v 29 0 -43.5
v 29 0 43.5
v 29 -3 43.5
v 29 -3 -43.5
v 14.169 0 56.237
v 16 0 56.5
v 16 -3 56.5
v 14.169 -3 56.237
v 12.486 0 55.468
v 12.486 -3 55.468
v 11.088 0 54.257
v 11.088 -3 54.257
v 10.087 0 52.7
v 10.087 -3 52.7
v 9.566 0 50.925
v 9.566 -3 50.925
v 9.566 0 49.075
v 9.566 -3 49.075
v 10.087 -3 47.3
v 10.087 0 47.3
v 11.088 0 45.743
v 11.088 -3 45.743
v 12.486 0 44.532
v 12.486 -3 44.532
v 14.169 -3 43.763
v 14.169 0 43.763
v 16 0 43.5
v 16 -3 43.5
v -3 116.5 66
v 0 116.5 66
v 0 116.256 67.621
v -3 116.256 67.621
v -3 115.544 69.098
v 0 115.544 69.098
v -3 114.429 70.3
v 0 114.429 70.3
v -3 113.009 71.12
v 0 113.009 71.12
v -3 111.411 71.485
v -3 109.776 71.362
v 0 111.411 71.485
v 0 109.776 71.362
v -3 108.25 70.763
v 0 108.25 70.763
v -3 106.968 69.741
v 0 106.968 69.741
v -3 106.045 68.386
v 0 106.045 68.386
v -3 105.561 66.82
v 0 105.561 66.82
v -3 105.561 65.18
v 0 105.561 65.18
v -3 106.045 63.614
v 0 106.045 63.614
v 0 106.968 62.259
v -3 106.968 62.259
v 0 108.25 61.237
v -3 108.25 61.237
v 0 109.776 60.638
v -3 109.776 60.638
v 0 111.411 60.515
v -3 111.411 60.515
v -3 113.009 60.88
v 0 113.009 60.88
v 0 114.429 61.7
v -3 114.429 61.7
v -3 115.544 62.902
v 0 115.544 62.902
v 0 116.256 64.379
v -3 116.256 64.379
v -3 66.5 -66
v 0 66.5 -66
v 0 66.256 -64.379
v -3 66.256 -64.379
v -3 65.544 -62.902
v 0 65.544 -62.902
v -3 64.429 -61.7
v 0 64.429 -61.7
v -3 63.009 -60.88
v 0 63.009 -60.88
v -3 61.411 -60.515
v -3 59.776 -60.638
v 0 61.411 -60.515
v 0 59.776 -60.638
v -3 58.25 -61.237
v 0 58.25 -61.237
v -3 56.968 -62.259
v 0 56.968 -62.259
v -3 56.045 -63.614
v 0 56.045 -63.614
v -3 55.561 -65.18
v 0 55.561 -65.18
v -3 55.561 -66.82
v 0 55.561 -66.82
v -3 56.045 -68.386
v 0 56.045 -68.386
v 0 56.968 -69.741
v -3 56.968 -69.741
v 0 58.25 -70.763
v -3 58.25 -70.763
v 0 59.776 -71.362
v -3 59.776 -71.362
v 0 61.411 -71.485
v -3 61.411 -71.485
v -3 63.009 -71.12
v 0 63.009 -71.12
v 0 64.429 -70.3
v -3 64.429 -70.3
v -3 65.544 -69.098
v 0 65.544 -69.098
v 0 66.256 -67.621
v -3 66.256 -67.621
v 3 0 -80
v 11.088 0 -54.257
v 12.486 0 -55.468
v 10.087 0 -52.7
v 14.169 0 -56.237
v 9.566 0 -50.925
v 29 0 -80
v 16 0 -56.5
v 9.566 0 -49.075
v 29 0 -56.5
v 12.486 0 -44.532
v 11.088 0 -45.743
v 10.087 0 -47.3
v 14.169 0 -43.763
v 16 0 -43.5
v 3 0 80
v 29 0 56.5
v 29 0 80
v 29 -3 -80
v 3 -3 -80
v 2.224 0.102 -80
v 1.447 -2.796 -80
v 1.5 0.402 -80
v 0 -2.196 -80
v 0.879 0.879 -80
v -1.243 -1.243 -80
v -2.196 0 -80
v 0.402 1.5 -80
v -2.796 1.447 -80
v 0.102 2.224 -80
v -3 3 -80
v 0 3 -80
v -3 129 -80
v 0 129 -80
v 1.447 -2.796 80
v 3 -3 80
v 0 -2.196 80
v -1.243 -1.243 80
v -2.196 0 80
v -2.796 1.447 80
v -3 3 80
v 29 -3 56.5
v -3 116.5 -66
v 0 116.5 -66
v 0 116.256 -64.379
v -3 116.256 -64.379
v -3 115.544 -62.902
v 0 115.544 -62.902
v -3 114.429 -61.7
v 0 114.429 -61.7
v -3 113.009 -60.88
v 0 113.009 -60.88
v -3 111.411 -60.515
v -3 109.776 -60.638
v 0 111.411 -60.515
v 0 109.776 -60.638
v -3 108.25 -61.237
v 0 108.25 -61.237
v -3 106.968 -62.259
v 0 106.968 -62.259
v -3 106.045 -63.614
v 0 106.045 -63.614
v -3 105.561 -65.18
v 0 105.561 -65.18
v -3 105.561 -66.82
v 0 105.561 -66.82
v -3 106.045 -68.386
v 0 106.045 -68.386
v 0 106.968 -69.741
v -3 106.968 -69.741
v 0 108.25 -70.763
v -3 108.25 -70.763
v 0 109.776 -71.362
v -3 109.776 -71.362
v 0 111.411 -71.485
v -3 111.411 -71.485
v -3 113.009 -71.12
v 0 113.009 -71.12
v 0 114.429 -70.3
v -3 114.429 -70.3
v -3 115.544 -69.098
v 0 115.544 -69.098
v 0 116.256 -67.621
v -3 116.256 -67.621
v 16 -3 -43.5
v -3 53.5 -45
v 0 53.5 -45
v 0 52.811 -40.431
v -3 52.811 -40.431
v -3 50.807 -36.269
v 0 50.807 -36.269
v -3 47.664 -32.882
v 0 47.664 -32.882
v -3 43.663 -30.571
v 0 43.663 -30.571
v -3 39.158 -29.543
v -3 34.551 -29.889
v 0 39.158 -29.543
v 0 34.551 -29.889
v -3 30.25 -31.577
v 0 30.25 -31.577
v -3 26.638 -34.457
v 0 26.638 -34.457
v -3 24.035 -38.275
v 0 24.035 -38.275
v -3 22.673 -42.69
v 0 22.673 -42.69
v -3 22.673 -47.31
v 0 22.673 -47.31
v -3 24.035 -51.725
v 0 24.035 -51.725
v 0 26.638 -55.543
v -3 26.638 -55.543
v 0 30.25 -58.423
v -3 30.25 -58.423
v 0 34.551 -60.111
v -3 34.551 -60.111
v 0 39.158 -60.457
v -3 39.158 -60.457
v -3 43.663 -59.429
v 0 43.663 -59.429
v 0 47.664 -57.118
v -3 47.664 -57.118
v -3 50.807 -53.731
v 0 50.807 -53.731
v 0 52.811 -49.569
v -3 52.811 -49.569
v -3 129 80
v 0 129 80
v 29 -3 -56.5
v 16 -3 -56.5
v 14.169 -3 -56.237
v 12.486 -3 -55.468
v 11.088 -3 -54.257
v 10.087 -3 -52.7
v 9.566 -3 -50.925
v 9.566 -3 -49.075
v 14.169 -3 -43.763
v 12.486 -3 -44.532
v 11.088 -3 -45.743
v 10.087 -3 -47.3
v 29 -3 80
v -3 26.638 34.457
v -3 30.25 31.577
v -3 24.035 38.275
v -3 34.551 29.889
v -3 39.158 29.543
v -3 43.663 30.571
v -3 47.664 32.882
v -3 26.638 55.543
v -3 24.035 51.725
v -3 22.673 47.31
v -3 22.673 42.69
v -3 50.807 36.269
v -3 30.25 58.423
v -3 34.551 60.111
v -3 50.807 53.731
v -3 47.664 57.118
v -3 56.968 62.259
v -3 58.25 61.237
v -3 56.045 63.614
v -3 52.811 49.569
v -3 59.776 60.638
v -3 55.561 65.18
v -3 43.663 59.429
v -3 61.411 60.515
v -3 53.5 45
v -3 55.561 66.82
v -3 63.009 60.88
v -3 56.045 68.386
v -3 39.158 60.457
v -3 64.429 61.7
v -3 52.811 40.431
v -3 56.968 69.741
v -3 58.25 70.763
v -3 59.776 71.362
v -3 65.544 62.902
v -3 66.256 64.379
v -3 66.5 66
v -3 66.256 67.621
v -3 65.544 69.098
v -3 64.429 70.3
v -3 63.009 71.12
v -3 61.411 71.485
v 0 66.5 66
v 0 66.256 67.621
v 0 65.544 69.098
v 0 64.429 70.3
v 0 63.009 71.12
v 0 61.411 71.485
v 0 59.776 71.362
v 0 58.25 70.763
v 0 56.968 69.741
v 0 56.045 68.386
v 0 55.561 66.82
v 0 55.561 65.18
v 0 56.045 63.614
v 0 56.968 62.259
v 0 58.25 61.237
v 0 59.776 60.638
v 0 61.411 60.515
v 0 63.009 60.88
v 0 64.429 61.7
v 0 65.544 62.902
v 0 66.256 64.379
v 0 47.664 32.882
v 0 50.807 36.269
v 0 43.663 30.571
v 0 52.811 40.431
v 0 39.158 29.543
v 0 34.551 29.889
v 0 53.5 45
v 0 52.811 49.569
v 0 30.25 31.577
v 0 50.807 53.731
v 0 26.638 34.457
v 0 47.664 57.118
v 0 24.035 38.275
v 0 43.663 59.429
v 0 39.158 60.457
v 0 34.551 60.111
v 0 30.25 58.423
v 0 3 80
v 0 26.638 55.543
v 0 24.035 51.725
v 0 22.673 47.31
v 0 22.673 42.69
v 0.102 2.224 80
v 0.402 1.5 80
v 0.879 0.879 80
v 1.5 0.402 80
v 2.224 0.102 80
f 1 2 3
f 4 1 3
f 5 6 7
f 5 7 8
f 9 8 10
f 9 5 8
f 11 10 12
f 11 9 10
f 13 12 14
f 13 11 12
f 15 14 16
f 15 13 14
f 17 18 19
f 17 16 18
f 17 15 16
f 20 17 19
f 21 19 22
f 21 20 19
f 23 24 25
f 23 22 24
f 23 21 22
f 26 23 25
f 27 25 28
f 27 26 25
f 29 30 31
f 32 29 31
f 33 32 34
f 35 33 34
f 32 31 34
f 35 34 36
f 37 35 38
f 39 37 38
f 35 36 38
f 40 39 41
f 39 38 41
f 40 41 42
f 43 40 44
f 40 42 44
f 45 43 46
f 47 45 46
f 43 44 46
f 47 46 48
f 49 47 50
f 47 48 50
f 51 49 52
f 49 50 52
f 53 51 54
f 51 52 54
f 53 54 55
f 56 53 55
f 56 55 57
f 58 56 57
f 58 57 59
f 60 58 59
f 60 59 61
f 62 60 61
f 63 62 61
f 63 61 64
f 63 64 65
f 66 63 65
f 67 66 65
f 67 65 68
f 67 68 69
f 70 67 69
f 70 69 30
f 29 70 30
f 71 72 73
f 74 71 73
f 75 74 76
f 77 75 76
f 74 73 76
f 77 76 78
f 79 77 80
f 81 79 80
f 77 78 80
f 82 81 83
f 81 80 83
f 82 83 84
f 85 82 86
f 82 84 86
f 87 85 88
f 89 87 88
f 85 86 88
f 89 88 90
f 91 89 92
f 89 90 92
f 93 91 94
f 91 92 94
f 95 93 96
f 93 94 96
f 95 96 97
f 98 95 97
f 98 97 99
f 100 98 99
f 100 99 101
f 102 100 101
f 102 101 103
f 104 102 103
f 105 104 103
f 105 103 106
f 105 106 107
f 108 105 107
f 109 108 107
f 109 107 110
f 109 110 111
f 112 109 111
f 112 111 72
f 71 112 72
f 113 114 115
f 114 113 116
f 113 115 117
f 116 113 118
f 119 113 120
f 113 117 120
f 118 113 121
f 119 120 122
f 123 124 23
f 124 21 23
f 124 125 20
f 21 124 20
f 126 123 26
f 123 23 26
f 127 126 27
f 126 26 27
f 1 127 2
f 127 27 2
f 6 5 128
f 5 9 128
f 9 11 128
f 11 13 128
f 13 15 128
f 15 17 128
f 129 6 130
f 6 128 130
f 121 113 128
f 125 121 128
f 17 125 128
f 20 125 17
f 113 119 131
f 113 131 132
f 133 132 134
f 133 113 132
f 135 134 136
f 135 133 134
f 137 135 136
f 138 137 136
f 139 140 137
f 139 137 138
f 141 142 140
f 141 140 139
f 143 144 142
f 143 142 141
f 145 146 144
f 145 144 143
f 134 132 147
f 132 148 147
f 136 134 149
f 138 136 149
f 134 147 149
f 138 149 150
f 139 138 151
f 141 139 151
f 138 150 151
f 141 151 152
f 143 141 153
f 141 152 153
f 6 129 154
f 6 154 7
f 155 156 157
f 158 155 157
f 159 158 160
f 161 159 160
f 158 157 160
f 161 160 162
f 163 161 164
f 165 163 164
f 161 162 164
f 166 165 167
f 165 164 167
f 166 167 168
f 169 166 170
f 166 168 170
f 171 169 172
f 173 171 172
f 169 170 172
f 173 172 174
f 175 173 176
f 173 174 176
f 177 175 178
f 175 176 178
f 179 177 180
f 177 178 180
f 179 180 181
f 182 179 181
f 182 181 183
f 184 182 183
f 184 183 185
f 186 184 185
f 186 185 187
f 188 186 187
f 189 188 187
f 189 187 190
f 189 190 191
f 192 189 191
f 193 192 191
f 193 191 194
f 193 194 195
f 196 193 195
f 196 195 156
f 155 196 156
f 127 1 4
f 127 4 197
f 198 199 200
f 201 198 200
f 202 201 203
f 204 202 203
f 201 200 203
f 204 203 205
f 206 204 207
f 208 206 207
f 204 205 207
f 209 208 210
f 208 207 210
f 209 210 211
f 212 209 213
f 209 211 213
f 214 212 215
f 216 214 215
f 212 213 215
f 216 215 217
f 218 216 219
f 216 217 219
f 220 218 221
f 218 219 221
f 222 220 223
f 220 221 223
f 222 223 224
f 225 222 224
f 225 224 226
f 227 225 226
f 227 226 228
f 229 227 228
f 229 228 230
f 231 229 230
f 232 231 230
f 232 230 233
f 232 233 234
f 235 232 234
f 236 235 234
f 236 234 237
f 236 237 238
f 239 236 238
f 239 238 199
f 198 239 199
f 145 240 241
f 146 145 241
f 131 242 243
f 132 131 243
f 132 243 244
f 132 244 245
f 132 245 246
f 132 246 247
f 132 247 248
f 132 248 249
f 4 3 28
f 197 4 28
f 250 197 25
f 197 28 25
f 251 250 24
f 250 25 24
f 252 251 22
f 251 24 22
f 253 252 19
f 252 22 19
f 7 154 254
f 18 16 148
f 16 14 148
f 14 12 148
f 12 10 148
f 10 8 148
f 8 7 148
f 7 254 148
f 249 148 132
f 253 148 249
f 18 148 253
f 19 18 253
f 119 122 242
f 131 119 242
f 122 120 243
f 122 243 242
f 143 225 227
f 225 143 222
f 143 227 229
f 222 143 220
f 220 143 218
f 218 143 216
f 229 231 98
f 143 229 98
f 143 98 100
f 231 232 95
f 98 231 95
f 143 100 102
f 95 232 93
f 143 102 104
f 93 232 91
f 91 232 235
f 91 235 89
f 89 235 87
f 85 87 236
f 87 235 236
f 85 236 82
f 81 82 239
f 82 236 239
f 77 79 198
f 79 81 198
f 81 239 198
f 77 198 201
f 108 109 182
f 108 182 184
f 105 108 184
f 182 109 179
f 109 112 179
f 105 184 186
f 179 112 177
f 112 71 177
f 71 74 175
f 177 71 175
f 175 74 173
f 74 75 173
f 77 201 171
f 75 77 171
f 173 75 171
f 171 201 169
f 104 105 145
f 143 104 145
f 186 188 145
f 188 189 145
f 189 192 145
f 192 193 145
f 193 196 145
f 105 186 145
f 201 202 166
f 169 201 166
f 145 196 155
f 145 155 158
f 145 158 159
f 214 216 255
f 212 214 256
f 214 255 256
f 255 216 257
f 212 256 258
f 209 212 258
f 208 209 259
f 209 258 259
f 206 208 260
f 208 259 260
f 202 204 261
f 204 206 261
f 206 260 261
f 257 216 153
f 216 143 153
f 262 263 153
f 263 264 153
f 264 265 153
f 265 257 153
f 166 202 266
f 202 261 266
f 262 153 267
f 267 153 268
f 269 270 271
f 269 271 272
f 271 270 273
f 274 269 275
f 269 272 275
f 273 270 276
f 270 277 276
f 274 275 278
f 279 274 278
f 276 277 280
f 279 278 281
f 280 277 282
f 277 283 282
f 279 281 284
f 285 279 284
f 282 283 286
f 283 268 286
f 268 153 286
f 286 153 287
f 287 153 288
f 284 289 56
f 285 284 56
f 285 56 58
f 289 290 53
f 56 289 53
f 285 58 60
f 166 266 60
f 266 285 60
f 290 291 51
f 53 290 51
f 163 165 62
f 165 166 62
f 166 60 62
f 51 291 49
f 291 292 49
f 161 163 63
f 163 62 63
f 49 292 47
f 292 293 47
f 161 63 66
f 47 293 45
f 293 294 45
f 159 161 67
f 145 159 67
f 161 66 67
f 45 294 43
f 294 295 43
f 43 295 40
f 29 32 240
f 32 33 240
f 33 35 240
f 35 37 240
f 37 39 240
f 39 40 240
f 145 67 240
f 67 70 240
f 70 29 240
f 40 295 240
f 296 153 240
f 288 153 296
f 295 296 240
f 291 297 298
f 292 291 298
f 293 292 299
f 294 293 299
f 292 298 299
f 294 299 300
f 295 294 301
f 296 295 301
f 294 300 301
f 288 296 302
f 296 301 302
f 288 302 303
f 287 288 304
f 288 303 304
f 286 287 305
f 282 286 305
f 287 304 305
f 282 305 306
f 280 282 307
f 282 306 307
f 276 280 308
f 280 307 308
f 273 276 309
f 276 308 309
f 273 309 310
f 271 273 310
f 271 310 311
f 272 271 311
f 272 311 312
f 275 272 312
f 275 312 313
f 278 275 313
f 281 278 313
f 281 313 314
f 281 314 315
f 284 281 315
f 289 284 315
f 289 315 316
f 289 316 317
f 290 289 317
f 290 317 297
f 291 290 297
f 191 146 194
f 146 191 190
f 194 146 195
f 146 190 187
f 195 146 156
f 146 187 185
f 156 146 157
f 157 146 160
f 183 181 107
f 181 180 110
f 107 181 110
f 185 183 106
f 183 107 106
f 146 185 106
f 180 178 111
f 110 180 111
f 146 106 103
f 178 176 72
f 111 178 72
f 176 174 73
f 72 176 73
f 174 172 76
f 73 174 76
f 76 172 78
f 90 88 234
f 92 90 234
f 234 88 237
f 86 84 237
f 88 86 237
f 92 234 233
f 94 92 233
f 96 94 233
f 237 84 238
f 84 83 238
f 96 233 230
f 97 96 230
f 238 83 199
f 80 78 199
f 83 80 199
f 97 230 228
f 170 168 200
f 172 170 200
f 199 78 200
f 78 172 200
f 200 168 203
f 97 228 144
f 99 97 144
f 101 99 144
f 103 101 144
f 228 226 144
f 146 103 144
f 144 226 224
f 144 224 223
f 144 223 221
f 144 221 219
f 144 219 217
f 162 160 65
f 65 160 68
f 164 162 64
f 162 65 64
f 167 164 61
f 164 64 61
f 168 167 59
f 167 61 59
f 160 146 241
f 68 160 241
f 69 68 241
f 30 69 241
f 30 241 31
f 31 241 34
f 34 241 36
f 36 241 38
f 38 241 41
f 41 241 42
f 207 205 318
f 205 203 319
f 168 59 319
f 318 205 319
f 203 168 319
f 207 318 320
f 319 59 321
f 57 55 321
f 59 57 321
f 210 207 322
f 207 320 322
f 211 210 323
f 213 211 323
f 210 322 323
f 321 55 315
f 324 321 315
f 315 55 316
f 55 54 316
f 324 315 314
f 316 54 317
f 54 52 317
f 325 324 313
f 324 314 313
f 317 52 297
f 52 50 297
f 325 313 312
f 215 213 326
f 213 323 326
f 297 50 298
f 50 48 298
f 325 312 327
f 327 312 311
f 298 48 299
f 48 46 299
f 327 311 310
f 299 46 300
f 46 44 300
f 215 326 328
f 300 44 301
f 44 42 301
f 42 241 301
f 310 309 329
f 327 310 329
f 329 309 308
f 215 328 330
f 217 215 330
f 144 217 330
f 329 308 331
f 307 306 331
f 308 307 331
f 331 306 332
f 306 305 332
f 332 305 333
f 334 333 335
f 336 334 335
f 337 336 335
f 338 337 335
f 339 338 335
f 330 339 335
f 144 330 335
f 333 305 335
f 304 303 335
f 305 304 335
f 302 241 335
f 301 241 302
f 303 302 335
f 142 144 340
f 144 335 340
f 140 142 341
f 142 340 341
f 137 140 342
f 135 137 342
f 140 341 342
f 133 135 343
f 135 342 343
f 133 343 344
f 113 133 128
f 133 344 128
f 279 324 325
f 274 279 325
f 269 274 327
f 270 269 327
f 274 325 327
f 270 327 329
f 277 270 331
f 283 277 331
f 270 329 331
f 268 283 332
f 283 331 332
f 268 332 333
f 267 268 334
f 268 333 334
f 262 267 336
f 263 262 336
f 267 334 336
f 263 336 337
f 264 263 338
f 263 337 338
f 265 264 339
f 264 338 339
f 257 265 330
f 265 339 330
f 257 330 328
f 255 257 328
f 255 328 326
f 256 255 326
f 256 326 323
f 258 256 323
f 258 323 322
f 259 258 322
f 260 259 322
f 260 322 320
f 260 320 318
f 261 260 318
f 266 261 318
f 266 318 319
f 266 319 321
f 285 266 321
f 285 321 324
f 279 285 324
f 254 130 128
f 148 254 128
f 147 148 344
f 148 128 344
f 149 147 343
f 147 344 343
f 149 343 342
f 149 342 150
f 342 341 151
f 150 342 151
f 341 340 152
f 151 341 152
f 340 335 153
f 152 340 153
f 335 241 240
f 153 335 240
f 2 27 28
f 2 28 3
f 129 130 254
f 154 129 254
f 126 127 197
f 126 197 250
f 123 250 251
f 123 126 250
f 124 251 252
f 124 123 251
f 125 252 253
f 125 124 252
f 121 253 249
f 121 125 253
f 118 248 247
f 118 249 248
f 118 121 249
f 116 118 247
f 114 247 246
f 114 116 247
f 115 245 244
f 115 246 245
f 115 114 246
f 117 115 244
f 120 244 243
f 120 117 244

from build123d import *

# Parameters (mm, degrees)
SM_BASE_FLANGE_1_DEPTH = 80
SKETCH_6_R             = 5.5
CUT_EXTRUDE_1_DEPTH    = 10
SKETCH_7_R             = 15.5
CUT_EXTRUDE_2_DEPTH    = 10
CUT_EXTRUDE_3_DEPTH    = 10


# Sheet-metal steps are written as plain solids
with BuildPart() as part:
    # Sketch 1 → Базовая кромка1 (new, symmetric)
    with BuildSketch(Plane.XY):
        with BuildLine():
            Line((0, 129), (0, 3))
            ThreePointArc((0, 3), (0.878679656, 0.878679656), (3, 0))
            Line((3, 0), (29, 0))
            Line((29, 0), (29, -3))
            Line((29, -3), (3, -3))
            ThreePointArc((3, -3), (-1.242640687, -1.242640687), (-3, 3))
            Line((-3, 3), (-3, 129))
            Line((-3, 129), (0, 129))
        make_face()
    extrude(amount=SM_BASE_FLANGE_1_DEPTH, both=True)

    # Эскиз6 → Вырез-Вытянуть1 (cut)
    with BuildSketch(Plane(origin=(0, 0, 0), x_dir=(0, 0, -1), z_dir=(1, 0, 0))):
        with Locations(Location((-66, 111, 0), (0, 0, 90))):
            Circle(SKETCH_6_R)
        with Locations(Location((66, 111, 0), (0, 0, 90))):
            Circle(SKETCH_6_R)
        with Locations(Location((66, 61, 0), (0, 0, 90))):
            Circle(SKETCH_6_R)
        with Locations(Location((-66, 61, 0), (0, 0, 90))):
            Circle(SKETCH_6_R)
    extrude(amount=-CUT_EXTRUDE_1_DEPTH, mode=Mode.SUBTRACT)

    # Эскиз7 → Вырез-Вытянуть2 (cut)
    with BuildSketch(Plane(origin=(0, 0, 0), x_dir=(0, 0, -1), z_dir=(1, 0, 0))):
        with Locations(Location((-45, 38, 0), (0, 0, 90))):
            Circle(SKETCH_7_R)
        with Locations(Location((45, 38, 0), (0, 0, 90))):
            Circle(SKETCH_7_R)
    extrude(amount=-CUT_EXTRUDE_2_DEPTH, mode=Mode.SUBTRACT)

    # Эскиз8 → Вырез-Вытянуть3 (cut)
    with BuildSketch(Plane(origin=(0, 0, 0), x_dir=(1, 0, 0), z_dir=(0, 1, 0))):
        with BuildLine():
            Line((16, -43.5), (29, -43.5))
            ThreePointArc((29, -43.5), (35.5, -50), (29, -56.5))
            Line((29, -56.5), (16, -56.5))
            ThreePointArc((16, -56.5), (9.5, -50), (16, -43.5))
        make_face()
        with BuildLine():
            Line((16, 56.5), (29, 56.5))
            ThreePointArc((29, 56.5), (35.5, 50), (29, 43.5))
            Line((29, 43.5), (16, 43.5))
            ThreePointArc((16, 43.5), (9.5, 50), (16, 56.5))
        make_face()
    extrude(amount=-CUT_EXTRUDE_3_DEPTH, mode=Mode.SUBTRACT)


solid = part.part
